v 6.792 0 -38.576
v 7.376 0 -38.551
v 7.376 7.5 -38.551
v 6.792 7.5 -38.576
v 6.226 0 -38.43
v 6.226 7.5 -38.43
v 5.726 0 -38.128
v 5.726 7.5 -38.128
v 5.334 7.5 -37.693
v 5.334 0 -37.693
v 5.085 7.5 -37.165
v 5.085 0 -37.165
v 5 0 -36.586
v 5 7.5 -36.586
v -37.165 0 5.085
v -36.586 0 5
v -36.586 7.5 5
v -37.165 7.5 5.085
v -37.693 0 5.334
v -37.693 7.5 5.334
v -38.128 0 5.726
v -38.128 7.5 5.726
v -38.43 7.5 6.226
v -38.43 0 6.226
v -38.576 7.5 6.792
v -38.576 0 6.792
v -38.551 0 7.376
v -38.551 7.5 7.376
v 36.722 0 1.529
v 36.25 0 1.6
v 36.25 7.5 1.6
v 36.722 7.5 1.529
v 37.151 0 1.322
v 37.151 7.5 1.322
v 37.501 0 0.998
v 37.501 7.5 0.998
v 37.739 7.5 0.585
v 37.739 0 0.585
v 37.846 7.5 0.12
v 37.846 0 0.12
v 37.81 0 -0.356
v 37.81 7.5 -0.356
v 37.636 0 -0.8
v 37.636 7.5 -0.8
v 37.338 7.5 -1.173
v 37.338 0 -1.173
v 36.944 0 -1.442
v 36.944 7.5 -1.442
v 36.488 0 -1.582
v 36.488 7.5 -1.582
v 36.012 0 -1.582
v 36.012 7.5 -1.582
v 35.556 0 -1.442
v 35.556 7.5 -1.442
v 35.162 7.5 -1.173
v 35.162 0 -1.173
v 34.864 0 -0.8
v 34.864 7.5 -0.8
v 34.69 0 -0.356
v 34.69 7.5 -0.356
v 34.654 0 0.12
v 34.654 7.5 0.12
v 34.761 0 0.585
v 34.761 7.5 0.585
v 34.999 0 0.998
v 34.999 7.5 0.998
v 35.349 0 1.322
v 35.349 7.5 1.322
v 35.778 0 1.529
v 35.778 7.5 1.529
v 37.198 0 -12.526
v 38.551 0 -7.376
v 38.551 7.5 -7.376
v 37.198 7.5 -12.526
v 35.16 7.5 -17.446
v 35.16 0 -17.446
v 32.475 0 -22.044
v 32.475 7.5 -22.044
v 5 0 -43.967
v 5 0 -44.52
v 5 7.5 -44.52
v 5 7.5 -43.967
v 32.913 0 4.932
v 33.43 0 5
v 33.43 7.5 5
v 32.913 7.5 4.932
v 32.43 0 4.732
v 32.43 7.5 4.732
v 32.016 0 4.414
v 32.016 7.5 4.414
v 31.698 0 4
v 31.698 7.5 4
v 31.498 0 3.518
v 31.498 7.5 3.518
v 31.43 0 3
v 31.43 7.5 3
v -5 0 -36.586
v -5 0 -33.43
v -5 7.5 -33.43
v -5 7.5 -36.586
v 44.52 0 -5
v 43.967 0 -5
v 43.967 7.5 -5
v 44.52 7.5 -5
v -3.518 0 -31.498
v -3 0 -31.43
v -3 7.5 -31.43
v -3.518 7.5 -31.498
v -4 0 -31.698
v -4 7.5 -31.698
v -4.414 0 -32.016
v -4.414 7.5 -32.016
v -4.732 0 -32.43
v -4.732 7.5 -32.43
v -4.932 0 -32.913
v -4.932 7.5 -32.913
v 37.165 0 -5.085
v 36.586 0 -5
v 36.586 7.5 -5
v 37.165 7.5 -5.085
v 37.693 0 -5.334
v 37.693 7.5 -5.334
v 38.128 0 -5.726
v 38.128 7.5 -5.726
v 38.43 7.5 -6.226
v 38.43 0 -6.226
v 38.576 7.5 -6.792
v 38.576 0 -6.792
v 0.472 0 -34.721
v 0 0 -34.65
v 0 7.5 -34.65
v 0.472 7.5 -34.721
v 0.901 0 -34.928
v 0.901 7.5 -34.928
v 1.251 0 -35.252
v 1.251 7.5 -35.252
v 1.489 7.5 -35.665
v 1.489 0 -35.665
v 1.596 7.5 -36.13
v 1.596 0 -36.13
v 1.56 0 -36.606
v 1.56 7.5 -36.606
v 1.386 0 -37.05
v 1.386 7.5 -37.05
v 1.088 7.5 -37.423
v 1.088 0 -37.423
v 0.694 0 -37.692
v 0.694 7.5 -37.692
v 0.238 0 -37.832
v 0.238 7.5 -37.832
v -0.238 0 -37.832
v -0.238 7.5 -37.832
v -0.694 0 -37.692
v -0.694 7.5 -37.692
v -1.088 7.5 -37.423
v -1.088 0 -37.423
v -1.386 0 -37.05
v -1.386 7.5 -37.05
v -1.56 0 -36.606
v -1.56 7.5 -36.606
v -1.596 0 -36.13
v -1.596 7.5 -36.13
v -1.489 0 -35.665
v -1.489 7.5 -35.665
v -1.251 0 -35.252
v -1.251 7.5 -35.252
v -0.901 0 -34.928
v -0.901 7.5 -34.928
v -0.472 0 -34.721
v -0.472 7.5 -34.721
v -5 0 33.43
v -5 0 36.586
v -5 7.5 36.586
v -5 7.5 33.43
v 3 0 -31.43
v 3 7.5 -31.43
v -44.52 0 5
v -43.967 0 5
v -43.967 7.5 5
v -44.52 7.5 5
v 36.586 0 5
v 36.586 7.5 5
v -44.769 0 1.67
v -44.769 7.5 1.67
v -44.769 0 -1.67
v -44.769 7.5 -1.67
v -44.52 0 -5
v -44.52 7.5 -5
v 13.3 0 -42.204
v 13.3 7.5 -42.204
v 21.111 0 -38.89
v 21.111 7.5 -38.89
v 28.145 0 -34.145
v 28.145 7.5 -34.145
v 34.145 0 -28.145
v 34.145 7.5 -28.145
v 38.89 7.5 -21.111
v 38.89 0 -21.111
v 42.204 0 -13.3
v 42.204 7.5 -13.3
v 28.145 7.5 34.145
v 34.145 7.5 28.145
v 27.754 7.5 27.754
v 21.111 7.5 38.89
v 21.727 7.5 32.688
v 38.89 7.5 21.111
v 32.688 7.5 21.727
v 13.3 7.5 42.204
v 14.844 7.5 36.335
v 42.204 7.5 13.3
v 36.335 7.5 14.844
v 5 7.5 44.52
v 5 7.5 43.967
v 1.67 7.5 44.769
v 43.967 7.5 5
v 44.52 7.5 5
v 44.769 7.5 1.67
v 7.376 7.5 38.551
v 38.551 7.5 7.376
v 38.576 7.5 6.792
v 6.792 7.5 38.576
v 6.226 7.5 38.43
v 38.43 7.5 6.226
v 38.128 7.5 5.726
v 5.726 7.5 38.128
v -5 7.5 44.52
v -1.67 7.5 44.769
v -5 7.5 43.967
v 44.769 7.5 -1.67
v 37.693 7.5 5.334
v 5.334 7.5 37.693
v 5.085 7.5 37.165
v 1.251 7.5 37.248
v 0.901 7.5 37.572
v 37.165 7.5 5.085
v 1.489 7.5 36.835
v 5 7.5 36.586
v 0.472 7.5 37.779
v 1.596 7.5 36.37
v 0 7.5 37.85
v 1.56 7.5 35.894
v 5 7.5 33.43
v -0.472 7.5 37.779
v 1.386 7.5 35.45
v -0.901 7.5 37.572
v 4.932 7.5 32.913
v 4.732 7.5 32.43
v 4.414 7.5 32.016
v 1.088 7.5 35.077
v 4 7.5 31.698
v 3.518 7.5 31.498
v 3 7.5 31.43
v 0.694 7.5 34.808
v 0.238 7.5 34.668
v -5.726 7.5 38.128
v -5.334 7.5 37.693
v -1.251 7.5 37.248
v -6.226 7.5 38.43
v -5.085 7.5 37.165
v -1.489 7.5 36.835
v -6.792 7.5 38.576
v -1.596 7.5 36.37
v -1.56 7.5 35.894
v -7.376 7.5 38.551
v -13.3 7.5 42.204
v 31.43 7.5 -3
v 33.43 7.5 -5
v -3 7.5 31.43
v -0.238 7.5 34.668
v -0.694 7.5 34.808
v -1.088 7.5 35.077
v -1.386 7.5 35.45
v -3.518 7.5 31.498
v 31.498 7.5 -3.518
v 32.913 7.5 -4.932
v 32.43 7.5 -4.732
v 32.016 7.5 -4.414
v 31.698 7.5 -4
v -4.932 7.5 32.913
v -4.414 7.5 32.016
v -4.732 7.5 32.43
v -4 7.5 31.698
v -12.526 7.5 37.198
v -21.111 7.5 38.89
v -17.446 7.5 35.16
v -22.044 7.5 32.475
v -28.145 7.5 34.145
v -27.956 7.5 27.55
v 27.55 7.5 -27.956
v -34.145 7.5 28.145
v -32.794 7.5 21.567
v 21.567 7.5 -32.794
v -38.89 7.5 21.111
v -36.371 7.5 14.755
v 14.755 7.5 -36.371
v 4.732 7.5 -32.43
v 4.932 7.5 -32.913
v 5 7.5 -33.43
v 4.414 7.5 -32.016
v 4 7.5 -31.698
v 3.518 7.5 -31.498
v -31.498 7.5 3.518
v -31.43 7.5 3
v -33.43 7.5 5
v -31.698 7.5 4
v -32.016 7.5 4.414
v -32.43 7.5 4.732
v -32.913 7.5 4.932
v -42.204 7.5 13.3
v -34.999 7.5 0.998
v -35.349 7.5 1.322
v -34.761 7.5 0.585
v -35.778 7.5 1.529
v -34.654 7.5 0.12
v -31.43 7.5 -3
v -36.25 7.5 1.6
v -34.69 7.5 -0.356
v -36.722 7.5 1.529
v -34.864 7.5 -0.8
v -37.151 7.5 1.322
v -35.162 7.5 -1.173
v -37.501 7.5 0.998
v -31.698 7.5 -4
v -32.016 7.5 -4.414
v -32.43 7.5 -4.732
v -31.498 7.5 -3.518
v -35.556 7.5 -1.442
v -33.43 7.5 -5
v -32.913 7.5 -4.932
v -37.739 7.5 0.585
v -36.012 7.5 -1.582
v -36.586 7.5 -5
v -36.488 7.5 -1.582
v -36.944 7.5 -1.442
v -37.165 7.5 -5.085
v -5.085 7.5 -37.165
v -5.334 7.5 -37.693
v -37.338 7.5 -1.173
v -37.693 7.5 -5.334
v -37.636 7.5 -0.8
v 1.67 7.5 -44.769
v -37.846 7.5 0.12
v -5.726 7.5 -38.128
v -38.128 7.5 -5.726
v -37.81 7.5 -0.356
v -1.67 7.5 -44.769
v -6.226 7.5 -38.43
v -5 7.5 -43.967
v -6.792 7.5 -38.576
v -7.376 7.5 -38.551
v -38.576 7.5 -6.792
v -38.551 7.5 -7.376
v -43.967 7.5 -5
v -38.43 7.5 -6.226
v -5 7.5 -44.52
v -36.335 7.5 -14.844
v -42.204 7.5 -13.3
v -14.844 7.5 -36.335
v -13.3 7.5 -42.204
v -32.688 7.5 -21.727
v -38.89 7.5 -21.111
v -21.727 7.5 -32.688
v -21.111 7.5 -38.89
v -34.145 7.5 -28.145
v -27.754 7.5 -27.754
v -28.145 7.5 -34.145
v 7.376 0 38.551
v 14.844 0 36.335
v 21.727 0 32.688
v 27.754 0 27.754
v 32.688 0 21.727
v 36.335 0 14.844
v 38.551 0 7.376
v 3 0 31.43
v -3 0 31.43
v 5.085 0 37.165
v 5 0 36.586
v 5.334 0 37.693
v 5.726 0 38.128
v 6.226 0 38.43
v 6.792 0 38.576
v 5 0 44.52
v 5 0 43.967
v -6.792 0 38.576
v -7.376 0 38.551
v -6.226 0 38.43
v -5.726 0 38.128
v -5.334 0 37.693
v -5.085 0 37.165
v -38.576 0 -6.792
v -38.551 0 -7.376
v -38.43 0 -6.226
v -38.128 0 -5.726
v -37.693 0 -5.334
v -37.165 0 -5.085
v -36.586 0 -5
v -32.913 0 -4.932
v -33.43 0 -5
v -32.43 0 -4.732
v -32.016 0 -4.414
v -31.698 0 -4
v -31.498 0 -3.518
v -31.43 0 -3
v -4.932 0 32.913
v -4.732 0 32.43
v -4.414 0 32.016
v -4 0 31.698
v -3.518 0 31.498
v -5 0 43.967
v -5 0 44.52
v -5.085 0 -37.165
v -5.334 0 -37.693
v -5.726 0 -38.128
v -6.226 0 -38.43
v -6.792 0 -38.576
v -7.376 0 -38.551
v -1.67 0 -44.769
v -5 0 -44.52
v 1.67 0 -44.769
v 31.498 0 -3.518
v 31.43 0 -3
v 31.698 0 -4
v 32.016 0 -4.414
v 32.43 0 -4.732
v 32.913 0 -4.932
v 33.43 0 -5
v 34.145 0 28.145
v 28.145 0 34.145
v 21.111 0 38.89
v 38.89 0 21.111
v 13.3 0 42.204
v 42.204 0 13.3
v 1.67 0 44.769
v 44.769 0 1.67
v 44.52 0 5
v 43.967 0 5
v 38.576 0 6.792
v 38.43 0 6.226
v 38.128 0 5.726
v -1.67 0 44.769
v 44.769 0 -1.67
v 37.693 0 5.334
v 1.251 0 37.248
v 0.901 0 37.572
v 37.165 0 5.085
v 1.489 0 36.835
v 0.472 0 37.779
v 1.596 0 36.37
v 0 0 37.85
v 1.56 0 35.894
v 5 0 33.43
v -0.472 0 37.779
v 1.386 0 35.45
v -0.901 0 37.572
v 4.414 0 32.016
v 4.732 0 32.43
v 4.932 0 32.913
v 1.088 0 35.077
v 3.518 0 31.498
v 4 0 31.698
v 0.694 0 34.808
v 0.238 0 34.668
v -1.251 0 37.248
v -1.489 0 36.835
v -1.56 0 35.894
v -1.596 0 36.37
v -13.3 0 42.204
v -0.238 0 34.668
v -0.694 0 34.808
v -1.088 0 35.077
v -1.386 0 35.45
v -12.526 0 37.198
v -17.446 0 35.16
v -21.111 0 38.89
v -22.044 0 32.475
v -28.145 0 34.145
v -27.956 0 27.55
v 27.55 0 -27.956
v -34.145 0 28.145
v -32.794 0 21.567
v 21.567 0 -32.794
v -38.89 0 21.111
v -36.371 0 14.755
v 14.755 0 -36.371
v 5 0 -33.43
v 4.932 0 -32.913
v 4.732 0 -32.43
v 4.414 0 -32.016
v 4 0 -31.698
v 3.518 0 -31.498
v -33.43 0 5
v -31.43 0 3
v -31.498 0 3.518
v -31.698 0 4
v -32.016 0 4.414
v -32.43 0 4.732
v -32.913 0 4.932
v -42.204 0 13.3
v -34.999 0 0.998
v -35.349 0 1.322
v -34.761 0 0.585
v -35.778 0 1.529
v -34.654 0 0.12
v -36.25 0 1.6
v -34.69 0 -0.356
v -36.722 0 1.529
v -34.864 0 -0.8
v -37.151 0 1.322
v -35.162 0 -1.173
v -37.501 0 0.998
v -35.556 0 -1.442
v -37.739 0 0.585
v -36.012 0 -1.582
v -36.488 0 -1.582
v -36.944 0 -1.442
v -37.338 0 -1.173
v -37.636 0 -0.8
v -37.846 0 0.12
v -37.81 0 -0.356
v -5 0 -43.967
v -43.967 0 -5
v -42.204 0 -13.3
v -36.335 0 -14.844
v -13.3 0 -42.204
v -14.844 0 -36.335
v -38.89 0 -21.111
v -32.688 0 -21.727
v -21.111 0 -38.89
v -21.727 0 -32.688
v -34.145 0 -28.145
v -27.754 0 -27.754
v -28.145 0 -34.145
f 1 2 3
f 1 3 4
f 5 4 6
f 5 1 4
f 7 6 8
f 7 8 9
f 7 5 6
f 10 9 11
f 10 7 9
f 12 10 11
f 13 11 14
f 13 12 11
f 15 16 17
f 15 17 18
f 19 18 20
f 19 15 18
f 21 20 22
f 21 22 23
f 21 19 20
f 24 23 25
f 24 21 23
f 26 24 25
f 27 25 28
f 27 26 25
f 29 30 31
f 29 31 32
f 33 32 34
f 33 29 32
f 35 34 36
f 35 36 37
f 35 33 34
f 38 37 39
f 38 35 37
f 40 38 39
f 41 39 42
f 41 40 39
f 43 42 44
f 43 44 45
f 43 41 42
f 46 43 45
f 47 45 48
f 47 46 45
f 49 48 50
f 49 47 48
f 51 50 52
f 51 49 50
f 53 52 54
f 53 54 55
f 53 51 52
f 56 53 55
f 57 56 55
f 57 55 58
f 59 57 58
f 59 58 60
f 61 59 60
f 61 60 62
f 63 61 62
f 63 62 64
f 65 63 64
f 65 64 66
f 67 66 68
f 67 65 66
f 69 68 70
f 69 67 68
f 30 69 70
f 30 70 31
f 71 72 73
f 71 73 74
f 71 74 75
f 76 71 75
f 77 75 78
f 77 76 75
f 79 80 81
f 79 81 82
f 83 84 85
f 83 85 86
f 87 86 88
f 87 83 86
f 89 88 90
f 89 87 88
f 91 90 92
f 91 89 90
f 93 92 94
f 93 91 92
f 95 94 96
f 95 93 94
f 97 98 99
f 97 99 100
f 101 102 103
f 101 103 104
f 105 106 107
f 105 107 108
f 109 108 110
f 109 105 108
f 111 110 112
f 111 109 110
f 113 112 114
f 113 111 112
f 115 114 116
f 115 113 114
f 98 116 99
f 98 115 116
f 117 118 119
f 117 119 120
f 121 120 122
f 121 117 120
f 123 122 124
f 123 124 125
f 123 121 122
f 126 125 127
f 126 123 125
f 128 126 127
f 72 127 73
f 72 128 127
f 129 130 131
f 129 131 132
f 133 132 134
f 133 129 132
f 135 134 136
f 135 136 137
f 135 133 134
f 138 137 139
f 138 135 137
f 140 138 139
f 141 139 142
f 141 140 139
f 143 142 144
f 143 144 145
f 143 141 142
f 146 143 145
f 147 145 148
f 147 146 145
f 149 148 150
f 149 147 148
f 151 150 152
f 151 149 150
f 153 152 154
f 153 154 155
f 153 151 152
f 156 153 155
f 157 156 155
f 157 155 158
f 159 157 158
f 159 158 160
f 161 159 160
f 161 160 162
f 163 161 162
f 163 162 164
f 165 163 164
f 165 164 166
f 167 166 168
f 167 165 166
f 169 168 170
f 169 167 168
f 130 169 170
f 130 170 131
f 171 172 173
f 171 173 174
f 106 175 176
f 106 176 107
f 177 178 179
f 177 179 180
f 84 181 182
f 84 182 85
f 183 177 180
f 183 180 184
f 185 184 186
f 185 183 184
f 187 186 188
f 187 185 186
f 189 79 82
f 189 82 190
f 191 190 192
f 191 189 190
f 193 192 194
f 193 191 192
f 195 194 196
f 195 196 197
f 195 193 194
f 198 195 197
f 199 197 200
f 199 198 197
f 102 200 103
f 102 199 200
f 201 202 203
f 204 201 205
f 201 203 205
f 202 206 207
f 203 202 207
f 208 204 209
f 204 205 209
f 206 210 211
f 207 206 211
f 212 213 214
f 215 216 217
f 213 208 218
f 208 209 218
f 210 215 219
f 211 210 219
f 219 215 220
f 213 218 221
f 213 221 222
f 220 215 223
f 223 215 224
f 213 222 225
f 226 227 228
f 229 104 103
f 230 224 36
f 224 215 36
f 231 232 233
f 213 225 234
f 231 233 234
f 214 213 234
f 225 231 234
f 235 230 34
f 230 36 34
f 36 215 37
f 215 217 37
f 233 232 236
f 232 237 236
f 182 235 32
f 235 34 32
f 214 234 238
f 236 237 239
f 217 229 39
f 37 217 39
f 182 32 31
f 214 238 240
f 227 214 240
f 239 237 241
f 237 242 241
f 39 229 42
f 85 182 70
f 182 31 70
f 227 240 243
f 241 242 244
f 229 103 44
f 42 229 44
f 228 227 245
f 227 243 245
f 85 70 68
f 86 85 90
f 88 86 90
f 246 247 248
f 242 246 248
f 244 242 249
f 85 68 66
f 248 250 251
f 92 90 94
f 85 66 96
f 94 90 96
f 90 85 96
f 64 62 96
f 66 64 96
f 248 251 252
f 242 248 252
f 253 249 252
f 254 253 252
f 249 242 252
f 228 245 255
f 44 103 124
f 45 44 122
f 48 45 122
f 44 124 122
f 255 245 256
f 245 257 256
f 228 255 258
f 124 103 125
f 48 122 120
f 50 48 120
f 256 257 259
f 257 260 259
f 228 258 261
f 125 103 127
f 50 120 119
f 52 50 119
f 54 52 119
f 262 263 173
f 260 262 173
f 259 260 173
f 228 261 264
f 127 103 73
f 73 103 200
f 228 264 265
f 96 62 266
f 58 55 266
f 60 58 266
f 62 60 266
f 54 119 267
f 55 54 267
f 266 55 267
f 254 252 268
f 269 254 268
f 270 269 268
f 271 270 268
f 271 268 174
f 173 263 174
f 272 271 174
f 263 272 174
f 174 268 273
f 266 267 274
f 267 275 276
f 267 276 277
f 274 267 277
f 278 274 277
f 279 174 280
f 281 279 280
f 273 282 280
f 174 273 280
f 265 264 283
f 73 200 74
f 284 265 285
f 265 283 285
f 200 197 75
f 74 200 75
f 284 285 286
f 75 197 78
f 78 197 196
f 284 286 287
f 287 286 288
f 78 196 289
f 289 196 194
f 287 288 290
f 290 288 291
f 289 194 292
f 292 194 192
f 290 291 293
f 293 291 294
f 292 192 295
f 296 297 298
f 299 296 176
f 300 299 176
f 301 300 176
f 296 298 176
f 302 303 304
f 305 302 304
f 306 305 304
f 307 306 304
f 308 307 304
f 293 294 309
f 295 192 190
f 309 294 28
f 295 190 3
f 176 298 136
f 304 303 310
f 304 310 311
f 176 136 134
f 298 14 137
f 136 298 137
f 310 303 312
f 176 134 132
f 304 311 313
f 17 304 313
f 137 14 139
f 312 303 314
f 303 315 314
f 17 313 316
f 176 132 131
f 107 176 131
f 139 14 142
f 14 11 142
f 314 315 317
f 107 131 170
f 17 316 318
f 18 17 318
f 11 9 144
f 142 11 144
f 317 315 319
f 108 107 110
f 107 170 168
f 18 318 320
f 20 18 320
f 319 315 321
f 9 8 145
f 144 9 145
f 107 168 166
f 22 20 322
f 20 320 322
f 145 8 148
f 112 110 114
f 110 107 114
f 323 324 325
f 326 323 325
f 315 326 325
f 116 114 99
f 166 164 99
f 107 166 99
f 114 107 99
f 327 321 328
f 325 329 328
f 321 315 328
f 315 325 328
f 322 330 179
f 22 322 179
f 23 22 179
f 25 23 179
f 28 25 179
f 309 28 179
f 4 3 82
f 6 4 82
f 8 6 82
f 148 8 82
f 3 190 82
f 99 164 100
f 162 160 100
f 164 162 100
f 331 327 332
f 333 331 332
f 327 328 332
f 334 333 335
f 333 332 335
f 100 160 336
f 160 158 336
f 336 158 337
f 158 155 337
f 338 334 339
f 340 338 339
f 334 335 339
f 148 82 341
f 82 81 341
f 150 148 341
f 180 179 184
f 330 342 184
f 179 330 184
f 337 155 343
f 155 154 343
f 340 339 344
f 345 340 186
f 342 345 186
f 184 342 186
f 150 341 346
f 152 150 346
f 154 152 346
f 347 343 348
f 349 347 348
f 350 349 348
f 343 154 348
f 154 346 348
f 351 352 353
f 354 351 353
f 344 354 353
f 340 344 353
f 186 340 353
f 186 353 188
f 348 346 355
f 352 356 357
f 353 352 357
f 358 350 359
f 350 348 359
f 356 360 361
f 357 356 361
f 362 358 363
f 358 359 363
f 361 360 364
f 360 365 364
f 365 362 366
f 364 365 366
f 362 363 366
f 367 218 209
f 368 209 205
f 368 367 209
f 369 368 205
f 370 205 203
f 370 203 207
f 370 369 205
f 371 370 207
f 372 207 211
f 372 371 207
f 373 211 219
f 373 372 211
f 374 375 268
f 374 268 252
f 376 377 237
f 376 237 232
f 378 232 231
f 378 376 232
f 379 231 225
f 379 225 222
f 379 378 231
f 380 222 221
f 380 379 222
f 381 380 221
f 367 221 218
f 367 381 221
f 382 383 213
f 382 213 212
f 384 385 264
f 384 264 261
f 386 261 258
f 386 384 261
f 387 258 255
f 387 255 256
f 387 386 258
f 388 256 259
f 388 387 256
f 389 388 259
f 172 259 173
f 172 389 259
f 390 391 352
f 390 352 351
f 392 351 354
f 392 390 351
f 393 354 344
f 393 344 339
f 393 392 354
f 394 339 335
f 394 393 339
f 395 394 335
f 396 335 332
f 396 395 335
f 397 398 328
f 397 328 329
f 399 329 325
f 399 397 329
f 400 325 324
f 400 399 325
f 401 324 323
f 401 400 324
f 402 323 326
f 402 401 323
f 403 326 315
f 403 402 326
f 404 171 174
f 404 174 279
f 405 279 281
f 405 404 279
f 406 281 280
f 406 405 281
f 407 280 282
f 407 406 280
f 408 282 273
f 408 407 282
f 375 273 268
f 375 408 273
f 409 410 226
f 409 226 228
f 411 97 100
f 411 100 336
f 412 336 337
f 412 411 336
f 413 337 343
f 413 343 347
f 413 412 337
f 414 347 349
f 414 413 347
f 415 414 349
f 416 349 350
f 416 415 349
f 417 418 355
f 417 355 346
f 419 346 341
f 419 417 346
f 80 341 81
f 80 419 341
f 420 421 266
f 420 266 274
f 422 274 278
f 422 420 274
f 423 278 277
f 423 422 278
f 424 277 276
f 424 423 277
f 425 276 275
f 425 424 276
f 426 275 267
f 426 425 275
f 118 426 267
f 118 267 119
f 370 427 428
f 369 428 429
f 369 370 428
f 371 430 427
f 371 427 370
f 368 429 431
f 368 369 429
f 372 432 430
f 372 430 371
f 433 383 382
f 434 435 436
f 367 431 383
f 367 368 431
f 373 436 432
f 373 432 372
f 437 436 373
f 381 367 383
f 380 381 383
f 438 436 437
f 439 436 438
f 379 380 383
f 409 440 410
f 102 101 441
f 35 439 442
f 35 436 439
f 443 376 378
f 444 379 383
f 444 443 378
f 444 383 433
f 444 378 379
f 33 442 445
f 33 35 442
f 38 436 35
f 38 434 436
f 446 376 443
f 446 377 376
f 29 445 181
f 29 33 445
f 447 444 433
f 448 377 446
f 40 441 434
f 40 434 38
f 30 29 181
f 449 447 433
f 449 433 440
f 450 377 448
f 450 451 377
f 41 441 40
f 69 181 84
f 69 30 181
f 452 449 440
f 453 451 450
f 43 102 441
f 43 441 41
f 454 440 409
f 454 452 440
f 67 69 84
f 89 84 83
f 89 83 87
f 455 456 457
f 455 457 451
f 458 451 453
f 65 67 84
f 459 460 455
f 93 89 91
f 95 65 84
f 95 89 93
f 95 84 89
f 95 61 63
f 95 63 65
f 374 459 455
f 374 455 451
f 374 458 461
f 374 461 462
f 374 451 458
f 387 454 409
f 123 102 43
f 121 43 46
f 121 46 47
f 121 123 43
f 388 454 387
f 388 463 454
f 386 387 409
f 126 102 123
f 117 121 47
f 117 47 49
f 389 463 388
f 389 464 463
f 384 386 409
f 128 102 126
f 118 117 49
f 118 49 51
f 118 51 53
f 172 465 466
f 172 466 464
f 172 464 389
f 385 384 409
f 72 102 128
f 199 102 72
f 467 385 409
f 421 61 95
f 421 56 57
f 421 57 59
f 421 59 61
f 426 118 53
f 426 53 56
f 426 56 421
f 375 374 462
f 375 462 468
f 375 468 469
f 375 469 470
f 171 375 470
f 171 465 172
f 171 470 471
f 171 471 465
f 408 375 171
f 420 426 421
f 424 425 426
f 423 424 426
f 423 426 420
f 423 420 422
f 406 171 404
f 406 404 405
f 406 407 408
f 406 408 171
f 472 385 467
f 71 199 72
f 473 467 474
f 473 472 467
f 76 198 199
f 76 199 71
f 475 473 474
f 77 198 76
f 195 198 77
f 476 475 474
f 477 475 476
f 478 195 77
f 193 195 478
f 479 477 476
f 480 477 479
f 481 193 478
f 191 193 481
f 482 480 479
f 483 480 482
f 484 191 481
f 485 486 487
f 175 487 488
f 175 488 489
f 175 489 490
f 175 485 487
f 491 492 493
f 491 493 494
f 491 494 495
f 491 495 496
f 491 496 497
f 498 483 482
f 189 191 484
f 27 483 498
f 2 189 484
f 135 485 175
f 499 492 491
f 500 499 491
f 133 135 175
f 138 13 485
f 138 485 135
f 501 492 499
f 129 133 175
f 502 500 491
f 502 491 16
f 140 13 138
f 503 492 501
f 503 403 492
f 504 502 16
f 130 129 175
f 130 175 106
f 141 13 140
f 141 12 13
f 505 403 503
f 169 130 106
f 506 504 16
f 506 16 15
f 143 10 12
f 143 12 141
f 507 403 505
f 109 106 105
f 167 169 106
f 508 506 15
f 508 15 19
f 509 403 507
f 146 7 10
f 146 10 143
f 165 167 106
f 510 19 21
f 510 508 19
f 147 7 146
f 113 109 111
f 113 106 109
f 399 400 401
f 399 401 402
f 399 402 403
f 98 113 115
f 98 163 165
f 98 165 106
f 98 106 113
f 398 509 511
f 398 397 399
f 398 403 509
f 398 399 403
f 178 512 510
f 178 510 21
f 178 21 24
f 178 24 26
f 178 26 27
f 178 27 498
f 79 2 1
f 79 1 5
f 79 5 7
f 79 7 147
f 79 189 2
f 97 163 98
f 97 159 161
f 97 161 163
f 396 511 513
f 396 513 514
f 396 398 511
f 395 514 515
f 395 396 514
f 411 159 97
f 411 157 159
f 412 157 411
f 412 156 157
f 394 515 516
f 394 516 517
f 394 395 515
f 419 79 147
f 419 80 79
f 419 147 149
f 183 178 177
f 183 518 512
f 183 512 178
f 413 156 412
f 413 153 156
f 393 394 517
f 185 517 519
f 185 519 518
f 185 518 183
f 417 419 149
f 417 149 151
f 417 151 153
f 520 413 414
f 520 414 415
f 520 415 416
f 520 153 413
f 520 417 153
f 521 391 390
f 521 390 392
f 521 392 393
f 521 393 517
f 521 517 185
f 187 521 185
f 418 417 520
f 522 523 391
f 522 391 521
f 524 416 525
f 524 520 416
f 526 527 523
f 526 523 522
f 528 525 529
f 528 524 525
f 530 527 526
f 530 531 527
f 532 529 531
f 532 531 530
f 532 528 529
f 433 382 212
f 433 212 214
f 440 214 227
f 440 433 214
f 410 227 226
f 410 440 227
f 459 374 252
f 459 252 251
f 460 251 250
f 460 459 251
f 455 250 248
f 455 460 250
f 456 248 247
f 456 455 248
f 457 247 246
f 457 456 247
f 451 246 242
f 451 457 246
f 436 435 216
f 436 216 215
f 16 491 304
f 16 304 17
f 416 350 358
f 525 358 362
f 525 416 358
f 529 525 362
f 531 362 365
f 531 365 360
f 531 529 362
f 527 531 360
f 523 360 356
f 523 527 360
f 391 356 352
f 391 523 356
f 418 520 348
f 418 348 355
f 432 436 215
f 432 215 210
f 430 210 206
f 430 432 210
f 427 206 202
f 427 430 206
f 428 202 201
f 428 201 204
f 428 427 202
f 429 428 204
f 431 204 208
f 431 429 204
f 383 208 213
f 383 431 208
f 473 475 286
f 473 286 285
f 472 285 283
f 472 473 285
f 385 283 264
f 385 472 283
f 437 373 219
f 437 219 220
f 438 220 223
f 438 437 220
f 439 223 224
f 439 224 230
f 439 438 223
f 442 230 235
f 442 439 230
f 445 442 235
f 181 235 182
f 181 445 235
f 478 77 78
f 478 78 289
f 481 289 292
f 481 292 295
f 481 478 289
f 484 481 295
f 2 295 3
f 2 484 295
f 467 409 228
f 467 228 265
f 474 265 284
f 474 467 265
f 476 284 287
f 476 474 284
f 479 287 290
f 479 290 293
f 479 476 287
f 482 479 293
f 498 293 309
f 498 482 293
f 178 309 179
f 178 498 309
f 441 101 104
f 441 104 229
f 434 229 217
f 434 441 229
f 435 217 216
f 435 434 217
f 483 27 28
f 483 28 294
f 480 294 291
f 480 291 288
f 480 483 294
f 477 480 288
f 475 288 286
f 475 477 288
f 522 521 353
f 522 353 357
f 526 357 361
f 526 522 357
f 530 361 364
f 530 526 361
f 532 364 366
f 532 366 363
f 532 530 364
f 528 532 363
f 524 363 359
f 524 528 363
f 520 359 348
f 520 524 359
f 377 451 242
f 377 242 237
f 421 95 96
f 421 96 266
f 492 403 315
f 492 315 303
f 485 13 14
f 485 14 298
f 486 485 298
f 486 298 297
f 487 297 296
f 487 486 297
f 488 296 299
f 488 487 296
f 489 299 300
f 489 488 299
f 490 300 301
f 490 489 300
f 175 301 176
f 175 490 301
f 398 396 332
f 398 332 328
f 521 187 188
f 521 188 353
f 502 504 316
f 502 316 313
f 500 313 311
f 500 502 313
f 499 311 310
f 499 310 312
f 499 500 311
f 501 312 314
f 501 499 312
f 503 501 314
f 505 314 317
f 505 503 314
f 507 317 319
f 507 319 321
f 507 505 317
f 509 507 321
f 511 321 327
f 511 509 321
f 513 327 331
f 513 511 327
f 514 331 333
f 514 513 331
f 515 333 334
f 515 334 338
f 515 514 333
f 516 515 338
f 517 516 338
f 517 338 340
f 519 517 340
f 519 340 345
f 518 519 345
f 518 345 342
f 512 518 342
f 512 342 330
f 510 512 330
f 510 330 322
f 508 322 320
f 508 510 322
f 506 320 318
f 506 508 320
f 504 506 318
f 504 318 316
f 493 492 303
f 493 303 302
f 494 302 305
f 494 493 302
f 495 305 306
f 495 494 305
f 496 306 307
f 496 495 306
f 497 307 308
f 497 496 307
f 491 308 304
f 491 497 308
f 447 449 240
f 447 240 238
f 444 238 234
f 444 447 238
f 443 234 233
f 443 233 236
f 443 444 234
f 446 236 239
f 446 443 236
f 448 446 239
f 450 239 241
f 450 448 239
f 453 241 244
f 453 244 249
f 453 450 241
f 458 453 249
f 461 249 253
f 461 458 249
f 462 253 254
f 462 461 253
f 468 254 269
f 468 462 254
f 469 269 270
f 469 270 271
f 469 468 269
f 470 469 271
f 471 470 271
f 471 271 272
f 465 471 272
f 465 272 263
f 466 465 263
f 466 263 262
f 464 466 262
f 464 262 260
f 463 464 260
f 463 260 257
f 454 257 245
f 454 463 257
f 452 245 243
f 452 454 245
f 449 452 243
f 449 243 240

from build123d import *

# Parameters (mm, degrees)
SKETCH1_R           = 1.6
BOSS_EXTRUDE1_DEPTH = 7.5


with BuildPart() as part:
    # Sketch1 → Boss-Extrude1 (new body)
    with BuildSketch(Plane(origin=(0, 0, 0), x_dir=(1, 0, 0), z_dir=(0, 1, 0))):
        with BuildLine():
            Line((-5, 43.966606646), (-5, 44.520107817))
            ThreePointArc((-5, 44.520107817), (0, 44.8), (5, 44.520107817))
            Line((5, 44.520107817), (5, 43.966606646))
            ThreePointArc((5, 43.966606646), (31.289475068, 31.289475068), (43.966606646, 5))
            Line((43.966606646, 5), (44.520107817, 5))
            ThreePointArc((44.520107817, 5), (44.8, 0), (44.520107817, -5))
            Line((44.520107817, -5), (43.966606646, -5))
            ThreePointArc((43.966606646, -5), (31.289475068, -31.289475068), (5, -43.966606646))
            Line((5, -43.966606646), (5, -44.520107817))
            ThreePointArc((5, -44.520107817), (0, -44.8), (-5, -44.520107817))
            Line((-5, -44.520107817), (-5, -43.966606646))
            ThreePointArc((-5, -43.966606646), (-31.289475068, -31.289475068), (-43.966606646, -5))
            Line((-43.966606646, -5), (-44.520107817, -5))
            ThreePointArc((-44.520107817, -5), (-44.8, 0), (-44.520107817, 5))
            Line((-44.520107817, 5), (-43.966606646, 5))
            ThreePointArc((-43.966606646, 5), (-31.289475068, 31.289475068), (-5, 43.966606646))
        make_face()
        with Locations(Location((36.25, 0, 0), (0, 0, 270))):
            Circle(SKETCH1_R, mode=Mode.SUBTRACT)
        with Locations(Location((0, -36.25, 0), (0, 0, 270))):
            Circle(SKETCH1_R, mode=Mode.SUBTRACT)
        with Locations(Location((-36.25, 0, 0), (0, 0, 270))):
            Circle(SKETCH1_R, mode=Mode.SUBTRACT)
        with Locations(Location((0, 36.25, 0), (0, 0, 270))):
            Circle(SKETCH1_R, mode=Mode.SUBTRACT)
        with BuildLine():
            Line((33.430226046, 5), (36.586370413, 5))
            ThreePointArc((36.586370413, 5), (38.127746073, 5.725574218), (38.550739294, 7.375838926))
            ThreePointArc((38.550739294, 7.375838926), (36.262271651, 15.02032472), (32.474994896, 22.043983453))
            ThreePointArc((32.474994896, 22.043983453), (21.567115852, 32.79362764), (7.375838926, 38.550739294))
            ThreePointArc((7.375838926, 38.550739294), (5.725574218, 38.127746073), (5, 36.586370413))
            Line((5, 36.586370413), (5, 33.430226046))
            ThreePointArc((5, 33.430226046), (4.414213562, 32.016012484), (3, 31.430226046))
            Line((3, 31.430226046), (-3, 31.430226046))
            ThreePointArc((-3, 31.430226046), (-4.414213562, 32.016012484), (-5, 33.430226046))
            Line((-5, 33.430226046), (-5, 36.586370413))
            ThreePointArc((-5, 36.586370413), (-5.725574218, 38.127746073), (-7.375838926, 38.550739294))
            ThreePointArc((-7.375838926, 38.550739294), (-27.753941162, 27.753941162), (-38.550739294, 7.375838926))
            ThreePointArc((-38.550739294, 7.375838926), (-38.127746073, 5.725574218), (-36.586370413, 5))
            Line((-36.586370413, 5), (-33.430226046, 5))
            ThreePointArc((-33.430226046, 5), (-32.016012484, 4.414213562), (-31.430226046, 3))
            Line((-31.430226046, 3), (-31.430226046, -3))
            ThreePointArc((-31.430226046, -3), (-32.016012484, -4.414213562), (-33.430226046, -5))
            Line((-33.430226046, -5), (-36.586370413, -5))
            ThreePointArc((-36.586370413, -5), (-38.127746073, -5.725574218), (-38.550739294, -7.375838926))
            ThreePointArc((-38.550739294, -7.375838926), (-32.79362764, -21.567115852), (-22.043983453, -32.474994896))
            ThreePointArc((-22.043983453, -32.474994896), (-15.02032472, -36.262271651), (-7.375838926, -38.550739294))
            ThreePointArc((-7.375838926, -38.550739294), (-5.725574218, -38.127746073), (-5, -36.586370413))
            Line((-5, -36.586370413), (-5, -33.430226046))
            ThreePointArc((-5, -33.430226046), (-4.414213562, -32.016012484), (-3, -31.430226046))
            Line((-3, -31.430226046), (3, -31.430226046))
            ThreePointArc((3, -31.430226046), (4.414213562, -32.016012484), (5, -33.430226046))
            Line((5, -33.430226046), (5, -36.586370413))
            ThreePointArc((5, -36.586370413), (5.725574218, -38.127746073), (7.375838926, -38.550739294))
            ThreePointArc((7.375838926, -38.550739294), (27.753941162, -27.753941162), (38.550739294, -7.375838926))
            ThreePointArc((38.550739294, -7.375838926), (38.127746073, -5.725574218), (36.586370413, -5))
            Line((36.586370413, -5), (33.430226046, -5))
            ThreePointArc((33.430226046, -5), (32.016012484, -4.414213562), (31.430226046, -3))
            Line((31.430226046, -3), (31.430226046, 3))
            ThreePointArc((31.430226046, 3), (32.016012484, 4.414213562), (33.430226046, 5))
        make_face(mode=Mode.SUBTRACT)
    extrude(amount=BOSS_EXTRUDE1_DEPTH)


solid = part.part
